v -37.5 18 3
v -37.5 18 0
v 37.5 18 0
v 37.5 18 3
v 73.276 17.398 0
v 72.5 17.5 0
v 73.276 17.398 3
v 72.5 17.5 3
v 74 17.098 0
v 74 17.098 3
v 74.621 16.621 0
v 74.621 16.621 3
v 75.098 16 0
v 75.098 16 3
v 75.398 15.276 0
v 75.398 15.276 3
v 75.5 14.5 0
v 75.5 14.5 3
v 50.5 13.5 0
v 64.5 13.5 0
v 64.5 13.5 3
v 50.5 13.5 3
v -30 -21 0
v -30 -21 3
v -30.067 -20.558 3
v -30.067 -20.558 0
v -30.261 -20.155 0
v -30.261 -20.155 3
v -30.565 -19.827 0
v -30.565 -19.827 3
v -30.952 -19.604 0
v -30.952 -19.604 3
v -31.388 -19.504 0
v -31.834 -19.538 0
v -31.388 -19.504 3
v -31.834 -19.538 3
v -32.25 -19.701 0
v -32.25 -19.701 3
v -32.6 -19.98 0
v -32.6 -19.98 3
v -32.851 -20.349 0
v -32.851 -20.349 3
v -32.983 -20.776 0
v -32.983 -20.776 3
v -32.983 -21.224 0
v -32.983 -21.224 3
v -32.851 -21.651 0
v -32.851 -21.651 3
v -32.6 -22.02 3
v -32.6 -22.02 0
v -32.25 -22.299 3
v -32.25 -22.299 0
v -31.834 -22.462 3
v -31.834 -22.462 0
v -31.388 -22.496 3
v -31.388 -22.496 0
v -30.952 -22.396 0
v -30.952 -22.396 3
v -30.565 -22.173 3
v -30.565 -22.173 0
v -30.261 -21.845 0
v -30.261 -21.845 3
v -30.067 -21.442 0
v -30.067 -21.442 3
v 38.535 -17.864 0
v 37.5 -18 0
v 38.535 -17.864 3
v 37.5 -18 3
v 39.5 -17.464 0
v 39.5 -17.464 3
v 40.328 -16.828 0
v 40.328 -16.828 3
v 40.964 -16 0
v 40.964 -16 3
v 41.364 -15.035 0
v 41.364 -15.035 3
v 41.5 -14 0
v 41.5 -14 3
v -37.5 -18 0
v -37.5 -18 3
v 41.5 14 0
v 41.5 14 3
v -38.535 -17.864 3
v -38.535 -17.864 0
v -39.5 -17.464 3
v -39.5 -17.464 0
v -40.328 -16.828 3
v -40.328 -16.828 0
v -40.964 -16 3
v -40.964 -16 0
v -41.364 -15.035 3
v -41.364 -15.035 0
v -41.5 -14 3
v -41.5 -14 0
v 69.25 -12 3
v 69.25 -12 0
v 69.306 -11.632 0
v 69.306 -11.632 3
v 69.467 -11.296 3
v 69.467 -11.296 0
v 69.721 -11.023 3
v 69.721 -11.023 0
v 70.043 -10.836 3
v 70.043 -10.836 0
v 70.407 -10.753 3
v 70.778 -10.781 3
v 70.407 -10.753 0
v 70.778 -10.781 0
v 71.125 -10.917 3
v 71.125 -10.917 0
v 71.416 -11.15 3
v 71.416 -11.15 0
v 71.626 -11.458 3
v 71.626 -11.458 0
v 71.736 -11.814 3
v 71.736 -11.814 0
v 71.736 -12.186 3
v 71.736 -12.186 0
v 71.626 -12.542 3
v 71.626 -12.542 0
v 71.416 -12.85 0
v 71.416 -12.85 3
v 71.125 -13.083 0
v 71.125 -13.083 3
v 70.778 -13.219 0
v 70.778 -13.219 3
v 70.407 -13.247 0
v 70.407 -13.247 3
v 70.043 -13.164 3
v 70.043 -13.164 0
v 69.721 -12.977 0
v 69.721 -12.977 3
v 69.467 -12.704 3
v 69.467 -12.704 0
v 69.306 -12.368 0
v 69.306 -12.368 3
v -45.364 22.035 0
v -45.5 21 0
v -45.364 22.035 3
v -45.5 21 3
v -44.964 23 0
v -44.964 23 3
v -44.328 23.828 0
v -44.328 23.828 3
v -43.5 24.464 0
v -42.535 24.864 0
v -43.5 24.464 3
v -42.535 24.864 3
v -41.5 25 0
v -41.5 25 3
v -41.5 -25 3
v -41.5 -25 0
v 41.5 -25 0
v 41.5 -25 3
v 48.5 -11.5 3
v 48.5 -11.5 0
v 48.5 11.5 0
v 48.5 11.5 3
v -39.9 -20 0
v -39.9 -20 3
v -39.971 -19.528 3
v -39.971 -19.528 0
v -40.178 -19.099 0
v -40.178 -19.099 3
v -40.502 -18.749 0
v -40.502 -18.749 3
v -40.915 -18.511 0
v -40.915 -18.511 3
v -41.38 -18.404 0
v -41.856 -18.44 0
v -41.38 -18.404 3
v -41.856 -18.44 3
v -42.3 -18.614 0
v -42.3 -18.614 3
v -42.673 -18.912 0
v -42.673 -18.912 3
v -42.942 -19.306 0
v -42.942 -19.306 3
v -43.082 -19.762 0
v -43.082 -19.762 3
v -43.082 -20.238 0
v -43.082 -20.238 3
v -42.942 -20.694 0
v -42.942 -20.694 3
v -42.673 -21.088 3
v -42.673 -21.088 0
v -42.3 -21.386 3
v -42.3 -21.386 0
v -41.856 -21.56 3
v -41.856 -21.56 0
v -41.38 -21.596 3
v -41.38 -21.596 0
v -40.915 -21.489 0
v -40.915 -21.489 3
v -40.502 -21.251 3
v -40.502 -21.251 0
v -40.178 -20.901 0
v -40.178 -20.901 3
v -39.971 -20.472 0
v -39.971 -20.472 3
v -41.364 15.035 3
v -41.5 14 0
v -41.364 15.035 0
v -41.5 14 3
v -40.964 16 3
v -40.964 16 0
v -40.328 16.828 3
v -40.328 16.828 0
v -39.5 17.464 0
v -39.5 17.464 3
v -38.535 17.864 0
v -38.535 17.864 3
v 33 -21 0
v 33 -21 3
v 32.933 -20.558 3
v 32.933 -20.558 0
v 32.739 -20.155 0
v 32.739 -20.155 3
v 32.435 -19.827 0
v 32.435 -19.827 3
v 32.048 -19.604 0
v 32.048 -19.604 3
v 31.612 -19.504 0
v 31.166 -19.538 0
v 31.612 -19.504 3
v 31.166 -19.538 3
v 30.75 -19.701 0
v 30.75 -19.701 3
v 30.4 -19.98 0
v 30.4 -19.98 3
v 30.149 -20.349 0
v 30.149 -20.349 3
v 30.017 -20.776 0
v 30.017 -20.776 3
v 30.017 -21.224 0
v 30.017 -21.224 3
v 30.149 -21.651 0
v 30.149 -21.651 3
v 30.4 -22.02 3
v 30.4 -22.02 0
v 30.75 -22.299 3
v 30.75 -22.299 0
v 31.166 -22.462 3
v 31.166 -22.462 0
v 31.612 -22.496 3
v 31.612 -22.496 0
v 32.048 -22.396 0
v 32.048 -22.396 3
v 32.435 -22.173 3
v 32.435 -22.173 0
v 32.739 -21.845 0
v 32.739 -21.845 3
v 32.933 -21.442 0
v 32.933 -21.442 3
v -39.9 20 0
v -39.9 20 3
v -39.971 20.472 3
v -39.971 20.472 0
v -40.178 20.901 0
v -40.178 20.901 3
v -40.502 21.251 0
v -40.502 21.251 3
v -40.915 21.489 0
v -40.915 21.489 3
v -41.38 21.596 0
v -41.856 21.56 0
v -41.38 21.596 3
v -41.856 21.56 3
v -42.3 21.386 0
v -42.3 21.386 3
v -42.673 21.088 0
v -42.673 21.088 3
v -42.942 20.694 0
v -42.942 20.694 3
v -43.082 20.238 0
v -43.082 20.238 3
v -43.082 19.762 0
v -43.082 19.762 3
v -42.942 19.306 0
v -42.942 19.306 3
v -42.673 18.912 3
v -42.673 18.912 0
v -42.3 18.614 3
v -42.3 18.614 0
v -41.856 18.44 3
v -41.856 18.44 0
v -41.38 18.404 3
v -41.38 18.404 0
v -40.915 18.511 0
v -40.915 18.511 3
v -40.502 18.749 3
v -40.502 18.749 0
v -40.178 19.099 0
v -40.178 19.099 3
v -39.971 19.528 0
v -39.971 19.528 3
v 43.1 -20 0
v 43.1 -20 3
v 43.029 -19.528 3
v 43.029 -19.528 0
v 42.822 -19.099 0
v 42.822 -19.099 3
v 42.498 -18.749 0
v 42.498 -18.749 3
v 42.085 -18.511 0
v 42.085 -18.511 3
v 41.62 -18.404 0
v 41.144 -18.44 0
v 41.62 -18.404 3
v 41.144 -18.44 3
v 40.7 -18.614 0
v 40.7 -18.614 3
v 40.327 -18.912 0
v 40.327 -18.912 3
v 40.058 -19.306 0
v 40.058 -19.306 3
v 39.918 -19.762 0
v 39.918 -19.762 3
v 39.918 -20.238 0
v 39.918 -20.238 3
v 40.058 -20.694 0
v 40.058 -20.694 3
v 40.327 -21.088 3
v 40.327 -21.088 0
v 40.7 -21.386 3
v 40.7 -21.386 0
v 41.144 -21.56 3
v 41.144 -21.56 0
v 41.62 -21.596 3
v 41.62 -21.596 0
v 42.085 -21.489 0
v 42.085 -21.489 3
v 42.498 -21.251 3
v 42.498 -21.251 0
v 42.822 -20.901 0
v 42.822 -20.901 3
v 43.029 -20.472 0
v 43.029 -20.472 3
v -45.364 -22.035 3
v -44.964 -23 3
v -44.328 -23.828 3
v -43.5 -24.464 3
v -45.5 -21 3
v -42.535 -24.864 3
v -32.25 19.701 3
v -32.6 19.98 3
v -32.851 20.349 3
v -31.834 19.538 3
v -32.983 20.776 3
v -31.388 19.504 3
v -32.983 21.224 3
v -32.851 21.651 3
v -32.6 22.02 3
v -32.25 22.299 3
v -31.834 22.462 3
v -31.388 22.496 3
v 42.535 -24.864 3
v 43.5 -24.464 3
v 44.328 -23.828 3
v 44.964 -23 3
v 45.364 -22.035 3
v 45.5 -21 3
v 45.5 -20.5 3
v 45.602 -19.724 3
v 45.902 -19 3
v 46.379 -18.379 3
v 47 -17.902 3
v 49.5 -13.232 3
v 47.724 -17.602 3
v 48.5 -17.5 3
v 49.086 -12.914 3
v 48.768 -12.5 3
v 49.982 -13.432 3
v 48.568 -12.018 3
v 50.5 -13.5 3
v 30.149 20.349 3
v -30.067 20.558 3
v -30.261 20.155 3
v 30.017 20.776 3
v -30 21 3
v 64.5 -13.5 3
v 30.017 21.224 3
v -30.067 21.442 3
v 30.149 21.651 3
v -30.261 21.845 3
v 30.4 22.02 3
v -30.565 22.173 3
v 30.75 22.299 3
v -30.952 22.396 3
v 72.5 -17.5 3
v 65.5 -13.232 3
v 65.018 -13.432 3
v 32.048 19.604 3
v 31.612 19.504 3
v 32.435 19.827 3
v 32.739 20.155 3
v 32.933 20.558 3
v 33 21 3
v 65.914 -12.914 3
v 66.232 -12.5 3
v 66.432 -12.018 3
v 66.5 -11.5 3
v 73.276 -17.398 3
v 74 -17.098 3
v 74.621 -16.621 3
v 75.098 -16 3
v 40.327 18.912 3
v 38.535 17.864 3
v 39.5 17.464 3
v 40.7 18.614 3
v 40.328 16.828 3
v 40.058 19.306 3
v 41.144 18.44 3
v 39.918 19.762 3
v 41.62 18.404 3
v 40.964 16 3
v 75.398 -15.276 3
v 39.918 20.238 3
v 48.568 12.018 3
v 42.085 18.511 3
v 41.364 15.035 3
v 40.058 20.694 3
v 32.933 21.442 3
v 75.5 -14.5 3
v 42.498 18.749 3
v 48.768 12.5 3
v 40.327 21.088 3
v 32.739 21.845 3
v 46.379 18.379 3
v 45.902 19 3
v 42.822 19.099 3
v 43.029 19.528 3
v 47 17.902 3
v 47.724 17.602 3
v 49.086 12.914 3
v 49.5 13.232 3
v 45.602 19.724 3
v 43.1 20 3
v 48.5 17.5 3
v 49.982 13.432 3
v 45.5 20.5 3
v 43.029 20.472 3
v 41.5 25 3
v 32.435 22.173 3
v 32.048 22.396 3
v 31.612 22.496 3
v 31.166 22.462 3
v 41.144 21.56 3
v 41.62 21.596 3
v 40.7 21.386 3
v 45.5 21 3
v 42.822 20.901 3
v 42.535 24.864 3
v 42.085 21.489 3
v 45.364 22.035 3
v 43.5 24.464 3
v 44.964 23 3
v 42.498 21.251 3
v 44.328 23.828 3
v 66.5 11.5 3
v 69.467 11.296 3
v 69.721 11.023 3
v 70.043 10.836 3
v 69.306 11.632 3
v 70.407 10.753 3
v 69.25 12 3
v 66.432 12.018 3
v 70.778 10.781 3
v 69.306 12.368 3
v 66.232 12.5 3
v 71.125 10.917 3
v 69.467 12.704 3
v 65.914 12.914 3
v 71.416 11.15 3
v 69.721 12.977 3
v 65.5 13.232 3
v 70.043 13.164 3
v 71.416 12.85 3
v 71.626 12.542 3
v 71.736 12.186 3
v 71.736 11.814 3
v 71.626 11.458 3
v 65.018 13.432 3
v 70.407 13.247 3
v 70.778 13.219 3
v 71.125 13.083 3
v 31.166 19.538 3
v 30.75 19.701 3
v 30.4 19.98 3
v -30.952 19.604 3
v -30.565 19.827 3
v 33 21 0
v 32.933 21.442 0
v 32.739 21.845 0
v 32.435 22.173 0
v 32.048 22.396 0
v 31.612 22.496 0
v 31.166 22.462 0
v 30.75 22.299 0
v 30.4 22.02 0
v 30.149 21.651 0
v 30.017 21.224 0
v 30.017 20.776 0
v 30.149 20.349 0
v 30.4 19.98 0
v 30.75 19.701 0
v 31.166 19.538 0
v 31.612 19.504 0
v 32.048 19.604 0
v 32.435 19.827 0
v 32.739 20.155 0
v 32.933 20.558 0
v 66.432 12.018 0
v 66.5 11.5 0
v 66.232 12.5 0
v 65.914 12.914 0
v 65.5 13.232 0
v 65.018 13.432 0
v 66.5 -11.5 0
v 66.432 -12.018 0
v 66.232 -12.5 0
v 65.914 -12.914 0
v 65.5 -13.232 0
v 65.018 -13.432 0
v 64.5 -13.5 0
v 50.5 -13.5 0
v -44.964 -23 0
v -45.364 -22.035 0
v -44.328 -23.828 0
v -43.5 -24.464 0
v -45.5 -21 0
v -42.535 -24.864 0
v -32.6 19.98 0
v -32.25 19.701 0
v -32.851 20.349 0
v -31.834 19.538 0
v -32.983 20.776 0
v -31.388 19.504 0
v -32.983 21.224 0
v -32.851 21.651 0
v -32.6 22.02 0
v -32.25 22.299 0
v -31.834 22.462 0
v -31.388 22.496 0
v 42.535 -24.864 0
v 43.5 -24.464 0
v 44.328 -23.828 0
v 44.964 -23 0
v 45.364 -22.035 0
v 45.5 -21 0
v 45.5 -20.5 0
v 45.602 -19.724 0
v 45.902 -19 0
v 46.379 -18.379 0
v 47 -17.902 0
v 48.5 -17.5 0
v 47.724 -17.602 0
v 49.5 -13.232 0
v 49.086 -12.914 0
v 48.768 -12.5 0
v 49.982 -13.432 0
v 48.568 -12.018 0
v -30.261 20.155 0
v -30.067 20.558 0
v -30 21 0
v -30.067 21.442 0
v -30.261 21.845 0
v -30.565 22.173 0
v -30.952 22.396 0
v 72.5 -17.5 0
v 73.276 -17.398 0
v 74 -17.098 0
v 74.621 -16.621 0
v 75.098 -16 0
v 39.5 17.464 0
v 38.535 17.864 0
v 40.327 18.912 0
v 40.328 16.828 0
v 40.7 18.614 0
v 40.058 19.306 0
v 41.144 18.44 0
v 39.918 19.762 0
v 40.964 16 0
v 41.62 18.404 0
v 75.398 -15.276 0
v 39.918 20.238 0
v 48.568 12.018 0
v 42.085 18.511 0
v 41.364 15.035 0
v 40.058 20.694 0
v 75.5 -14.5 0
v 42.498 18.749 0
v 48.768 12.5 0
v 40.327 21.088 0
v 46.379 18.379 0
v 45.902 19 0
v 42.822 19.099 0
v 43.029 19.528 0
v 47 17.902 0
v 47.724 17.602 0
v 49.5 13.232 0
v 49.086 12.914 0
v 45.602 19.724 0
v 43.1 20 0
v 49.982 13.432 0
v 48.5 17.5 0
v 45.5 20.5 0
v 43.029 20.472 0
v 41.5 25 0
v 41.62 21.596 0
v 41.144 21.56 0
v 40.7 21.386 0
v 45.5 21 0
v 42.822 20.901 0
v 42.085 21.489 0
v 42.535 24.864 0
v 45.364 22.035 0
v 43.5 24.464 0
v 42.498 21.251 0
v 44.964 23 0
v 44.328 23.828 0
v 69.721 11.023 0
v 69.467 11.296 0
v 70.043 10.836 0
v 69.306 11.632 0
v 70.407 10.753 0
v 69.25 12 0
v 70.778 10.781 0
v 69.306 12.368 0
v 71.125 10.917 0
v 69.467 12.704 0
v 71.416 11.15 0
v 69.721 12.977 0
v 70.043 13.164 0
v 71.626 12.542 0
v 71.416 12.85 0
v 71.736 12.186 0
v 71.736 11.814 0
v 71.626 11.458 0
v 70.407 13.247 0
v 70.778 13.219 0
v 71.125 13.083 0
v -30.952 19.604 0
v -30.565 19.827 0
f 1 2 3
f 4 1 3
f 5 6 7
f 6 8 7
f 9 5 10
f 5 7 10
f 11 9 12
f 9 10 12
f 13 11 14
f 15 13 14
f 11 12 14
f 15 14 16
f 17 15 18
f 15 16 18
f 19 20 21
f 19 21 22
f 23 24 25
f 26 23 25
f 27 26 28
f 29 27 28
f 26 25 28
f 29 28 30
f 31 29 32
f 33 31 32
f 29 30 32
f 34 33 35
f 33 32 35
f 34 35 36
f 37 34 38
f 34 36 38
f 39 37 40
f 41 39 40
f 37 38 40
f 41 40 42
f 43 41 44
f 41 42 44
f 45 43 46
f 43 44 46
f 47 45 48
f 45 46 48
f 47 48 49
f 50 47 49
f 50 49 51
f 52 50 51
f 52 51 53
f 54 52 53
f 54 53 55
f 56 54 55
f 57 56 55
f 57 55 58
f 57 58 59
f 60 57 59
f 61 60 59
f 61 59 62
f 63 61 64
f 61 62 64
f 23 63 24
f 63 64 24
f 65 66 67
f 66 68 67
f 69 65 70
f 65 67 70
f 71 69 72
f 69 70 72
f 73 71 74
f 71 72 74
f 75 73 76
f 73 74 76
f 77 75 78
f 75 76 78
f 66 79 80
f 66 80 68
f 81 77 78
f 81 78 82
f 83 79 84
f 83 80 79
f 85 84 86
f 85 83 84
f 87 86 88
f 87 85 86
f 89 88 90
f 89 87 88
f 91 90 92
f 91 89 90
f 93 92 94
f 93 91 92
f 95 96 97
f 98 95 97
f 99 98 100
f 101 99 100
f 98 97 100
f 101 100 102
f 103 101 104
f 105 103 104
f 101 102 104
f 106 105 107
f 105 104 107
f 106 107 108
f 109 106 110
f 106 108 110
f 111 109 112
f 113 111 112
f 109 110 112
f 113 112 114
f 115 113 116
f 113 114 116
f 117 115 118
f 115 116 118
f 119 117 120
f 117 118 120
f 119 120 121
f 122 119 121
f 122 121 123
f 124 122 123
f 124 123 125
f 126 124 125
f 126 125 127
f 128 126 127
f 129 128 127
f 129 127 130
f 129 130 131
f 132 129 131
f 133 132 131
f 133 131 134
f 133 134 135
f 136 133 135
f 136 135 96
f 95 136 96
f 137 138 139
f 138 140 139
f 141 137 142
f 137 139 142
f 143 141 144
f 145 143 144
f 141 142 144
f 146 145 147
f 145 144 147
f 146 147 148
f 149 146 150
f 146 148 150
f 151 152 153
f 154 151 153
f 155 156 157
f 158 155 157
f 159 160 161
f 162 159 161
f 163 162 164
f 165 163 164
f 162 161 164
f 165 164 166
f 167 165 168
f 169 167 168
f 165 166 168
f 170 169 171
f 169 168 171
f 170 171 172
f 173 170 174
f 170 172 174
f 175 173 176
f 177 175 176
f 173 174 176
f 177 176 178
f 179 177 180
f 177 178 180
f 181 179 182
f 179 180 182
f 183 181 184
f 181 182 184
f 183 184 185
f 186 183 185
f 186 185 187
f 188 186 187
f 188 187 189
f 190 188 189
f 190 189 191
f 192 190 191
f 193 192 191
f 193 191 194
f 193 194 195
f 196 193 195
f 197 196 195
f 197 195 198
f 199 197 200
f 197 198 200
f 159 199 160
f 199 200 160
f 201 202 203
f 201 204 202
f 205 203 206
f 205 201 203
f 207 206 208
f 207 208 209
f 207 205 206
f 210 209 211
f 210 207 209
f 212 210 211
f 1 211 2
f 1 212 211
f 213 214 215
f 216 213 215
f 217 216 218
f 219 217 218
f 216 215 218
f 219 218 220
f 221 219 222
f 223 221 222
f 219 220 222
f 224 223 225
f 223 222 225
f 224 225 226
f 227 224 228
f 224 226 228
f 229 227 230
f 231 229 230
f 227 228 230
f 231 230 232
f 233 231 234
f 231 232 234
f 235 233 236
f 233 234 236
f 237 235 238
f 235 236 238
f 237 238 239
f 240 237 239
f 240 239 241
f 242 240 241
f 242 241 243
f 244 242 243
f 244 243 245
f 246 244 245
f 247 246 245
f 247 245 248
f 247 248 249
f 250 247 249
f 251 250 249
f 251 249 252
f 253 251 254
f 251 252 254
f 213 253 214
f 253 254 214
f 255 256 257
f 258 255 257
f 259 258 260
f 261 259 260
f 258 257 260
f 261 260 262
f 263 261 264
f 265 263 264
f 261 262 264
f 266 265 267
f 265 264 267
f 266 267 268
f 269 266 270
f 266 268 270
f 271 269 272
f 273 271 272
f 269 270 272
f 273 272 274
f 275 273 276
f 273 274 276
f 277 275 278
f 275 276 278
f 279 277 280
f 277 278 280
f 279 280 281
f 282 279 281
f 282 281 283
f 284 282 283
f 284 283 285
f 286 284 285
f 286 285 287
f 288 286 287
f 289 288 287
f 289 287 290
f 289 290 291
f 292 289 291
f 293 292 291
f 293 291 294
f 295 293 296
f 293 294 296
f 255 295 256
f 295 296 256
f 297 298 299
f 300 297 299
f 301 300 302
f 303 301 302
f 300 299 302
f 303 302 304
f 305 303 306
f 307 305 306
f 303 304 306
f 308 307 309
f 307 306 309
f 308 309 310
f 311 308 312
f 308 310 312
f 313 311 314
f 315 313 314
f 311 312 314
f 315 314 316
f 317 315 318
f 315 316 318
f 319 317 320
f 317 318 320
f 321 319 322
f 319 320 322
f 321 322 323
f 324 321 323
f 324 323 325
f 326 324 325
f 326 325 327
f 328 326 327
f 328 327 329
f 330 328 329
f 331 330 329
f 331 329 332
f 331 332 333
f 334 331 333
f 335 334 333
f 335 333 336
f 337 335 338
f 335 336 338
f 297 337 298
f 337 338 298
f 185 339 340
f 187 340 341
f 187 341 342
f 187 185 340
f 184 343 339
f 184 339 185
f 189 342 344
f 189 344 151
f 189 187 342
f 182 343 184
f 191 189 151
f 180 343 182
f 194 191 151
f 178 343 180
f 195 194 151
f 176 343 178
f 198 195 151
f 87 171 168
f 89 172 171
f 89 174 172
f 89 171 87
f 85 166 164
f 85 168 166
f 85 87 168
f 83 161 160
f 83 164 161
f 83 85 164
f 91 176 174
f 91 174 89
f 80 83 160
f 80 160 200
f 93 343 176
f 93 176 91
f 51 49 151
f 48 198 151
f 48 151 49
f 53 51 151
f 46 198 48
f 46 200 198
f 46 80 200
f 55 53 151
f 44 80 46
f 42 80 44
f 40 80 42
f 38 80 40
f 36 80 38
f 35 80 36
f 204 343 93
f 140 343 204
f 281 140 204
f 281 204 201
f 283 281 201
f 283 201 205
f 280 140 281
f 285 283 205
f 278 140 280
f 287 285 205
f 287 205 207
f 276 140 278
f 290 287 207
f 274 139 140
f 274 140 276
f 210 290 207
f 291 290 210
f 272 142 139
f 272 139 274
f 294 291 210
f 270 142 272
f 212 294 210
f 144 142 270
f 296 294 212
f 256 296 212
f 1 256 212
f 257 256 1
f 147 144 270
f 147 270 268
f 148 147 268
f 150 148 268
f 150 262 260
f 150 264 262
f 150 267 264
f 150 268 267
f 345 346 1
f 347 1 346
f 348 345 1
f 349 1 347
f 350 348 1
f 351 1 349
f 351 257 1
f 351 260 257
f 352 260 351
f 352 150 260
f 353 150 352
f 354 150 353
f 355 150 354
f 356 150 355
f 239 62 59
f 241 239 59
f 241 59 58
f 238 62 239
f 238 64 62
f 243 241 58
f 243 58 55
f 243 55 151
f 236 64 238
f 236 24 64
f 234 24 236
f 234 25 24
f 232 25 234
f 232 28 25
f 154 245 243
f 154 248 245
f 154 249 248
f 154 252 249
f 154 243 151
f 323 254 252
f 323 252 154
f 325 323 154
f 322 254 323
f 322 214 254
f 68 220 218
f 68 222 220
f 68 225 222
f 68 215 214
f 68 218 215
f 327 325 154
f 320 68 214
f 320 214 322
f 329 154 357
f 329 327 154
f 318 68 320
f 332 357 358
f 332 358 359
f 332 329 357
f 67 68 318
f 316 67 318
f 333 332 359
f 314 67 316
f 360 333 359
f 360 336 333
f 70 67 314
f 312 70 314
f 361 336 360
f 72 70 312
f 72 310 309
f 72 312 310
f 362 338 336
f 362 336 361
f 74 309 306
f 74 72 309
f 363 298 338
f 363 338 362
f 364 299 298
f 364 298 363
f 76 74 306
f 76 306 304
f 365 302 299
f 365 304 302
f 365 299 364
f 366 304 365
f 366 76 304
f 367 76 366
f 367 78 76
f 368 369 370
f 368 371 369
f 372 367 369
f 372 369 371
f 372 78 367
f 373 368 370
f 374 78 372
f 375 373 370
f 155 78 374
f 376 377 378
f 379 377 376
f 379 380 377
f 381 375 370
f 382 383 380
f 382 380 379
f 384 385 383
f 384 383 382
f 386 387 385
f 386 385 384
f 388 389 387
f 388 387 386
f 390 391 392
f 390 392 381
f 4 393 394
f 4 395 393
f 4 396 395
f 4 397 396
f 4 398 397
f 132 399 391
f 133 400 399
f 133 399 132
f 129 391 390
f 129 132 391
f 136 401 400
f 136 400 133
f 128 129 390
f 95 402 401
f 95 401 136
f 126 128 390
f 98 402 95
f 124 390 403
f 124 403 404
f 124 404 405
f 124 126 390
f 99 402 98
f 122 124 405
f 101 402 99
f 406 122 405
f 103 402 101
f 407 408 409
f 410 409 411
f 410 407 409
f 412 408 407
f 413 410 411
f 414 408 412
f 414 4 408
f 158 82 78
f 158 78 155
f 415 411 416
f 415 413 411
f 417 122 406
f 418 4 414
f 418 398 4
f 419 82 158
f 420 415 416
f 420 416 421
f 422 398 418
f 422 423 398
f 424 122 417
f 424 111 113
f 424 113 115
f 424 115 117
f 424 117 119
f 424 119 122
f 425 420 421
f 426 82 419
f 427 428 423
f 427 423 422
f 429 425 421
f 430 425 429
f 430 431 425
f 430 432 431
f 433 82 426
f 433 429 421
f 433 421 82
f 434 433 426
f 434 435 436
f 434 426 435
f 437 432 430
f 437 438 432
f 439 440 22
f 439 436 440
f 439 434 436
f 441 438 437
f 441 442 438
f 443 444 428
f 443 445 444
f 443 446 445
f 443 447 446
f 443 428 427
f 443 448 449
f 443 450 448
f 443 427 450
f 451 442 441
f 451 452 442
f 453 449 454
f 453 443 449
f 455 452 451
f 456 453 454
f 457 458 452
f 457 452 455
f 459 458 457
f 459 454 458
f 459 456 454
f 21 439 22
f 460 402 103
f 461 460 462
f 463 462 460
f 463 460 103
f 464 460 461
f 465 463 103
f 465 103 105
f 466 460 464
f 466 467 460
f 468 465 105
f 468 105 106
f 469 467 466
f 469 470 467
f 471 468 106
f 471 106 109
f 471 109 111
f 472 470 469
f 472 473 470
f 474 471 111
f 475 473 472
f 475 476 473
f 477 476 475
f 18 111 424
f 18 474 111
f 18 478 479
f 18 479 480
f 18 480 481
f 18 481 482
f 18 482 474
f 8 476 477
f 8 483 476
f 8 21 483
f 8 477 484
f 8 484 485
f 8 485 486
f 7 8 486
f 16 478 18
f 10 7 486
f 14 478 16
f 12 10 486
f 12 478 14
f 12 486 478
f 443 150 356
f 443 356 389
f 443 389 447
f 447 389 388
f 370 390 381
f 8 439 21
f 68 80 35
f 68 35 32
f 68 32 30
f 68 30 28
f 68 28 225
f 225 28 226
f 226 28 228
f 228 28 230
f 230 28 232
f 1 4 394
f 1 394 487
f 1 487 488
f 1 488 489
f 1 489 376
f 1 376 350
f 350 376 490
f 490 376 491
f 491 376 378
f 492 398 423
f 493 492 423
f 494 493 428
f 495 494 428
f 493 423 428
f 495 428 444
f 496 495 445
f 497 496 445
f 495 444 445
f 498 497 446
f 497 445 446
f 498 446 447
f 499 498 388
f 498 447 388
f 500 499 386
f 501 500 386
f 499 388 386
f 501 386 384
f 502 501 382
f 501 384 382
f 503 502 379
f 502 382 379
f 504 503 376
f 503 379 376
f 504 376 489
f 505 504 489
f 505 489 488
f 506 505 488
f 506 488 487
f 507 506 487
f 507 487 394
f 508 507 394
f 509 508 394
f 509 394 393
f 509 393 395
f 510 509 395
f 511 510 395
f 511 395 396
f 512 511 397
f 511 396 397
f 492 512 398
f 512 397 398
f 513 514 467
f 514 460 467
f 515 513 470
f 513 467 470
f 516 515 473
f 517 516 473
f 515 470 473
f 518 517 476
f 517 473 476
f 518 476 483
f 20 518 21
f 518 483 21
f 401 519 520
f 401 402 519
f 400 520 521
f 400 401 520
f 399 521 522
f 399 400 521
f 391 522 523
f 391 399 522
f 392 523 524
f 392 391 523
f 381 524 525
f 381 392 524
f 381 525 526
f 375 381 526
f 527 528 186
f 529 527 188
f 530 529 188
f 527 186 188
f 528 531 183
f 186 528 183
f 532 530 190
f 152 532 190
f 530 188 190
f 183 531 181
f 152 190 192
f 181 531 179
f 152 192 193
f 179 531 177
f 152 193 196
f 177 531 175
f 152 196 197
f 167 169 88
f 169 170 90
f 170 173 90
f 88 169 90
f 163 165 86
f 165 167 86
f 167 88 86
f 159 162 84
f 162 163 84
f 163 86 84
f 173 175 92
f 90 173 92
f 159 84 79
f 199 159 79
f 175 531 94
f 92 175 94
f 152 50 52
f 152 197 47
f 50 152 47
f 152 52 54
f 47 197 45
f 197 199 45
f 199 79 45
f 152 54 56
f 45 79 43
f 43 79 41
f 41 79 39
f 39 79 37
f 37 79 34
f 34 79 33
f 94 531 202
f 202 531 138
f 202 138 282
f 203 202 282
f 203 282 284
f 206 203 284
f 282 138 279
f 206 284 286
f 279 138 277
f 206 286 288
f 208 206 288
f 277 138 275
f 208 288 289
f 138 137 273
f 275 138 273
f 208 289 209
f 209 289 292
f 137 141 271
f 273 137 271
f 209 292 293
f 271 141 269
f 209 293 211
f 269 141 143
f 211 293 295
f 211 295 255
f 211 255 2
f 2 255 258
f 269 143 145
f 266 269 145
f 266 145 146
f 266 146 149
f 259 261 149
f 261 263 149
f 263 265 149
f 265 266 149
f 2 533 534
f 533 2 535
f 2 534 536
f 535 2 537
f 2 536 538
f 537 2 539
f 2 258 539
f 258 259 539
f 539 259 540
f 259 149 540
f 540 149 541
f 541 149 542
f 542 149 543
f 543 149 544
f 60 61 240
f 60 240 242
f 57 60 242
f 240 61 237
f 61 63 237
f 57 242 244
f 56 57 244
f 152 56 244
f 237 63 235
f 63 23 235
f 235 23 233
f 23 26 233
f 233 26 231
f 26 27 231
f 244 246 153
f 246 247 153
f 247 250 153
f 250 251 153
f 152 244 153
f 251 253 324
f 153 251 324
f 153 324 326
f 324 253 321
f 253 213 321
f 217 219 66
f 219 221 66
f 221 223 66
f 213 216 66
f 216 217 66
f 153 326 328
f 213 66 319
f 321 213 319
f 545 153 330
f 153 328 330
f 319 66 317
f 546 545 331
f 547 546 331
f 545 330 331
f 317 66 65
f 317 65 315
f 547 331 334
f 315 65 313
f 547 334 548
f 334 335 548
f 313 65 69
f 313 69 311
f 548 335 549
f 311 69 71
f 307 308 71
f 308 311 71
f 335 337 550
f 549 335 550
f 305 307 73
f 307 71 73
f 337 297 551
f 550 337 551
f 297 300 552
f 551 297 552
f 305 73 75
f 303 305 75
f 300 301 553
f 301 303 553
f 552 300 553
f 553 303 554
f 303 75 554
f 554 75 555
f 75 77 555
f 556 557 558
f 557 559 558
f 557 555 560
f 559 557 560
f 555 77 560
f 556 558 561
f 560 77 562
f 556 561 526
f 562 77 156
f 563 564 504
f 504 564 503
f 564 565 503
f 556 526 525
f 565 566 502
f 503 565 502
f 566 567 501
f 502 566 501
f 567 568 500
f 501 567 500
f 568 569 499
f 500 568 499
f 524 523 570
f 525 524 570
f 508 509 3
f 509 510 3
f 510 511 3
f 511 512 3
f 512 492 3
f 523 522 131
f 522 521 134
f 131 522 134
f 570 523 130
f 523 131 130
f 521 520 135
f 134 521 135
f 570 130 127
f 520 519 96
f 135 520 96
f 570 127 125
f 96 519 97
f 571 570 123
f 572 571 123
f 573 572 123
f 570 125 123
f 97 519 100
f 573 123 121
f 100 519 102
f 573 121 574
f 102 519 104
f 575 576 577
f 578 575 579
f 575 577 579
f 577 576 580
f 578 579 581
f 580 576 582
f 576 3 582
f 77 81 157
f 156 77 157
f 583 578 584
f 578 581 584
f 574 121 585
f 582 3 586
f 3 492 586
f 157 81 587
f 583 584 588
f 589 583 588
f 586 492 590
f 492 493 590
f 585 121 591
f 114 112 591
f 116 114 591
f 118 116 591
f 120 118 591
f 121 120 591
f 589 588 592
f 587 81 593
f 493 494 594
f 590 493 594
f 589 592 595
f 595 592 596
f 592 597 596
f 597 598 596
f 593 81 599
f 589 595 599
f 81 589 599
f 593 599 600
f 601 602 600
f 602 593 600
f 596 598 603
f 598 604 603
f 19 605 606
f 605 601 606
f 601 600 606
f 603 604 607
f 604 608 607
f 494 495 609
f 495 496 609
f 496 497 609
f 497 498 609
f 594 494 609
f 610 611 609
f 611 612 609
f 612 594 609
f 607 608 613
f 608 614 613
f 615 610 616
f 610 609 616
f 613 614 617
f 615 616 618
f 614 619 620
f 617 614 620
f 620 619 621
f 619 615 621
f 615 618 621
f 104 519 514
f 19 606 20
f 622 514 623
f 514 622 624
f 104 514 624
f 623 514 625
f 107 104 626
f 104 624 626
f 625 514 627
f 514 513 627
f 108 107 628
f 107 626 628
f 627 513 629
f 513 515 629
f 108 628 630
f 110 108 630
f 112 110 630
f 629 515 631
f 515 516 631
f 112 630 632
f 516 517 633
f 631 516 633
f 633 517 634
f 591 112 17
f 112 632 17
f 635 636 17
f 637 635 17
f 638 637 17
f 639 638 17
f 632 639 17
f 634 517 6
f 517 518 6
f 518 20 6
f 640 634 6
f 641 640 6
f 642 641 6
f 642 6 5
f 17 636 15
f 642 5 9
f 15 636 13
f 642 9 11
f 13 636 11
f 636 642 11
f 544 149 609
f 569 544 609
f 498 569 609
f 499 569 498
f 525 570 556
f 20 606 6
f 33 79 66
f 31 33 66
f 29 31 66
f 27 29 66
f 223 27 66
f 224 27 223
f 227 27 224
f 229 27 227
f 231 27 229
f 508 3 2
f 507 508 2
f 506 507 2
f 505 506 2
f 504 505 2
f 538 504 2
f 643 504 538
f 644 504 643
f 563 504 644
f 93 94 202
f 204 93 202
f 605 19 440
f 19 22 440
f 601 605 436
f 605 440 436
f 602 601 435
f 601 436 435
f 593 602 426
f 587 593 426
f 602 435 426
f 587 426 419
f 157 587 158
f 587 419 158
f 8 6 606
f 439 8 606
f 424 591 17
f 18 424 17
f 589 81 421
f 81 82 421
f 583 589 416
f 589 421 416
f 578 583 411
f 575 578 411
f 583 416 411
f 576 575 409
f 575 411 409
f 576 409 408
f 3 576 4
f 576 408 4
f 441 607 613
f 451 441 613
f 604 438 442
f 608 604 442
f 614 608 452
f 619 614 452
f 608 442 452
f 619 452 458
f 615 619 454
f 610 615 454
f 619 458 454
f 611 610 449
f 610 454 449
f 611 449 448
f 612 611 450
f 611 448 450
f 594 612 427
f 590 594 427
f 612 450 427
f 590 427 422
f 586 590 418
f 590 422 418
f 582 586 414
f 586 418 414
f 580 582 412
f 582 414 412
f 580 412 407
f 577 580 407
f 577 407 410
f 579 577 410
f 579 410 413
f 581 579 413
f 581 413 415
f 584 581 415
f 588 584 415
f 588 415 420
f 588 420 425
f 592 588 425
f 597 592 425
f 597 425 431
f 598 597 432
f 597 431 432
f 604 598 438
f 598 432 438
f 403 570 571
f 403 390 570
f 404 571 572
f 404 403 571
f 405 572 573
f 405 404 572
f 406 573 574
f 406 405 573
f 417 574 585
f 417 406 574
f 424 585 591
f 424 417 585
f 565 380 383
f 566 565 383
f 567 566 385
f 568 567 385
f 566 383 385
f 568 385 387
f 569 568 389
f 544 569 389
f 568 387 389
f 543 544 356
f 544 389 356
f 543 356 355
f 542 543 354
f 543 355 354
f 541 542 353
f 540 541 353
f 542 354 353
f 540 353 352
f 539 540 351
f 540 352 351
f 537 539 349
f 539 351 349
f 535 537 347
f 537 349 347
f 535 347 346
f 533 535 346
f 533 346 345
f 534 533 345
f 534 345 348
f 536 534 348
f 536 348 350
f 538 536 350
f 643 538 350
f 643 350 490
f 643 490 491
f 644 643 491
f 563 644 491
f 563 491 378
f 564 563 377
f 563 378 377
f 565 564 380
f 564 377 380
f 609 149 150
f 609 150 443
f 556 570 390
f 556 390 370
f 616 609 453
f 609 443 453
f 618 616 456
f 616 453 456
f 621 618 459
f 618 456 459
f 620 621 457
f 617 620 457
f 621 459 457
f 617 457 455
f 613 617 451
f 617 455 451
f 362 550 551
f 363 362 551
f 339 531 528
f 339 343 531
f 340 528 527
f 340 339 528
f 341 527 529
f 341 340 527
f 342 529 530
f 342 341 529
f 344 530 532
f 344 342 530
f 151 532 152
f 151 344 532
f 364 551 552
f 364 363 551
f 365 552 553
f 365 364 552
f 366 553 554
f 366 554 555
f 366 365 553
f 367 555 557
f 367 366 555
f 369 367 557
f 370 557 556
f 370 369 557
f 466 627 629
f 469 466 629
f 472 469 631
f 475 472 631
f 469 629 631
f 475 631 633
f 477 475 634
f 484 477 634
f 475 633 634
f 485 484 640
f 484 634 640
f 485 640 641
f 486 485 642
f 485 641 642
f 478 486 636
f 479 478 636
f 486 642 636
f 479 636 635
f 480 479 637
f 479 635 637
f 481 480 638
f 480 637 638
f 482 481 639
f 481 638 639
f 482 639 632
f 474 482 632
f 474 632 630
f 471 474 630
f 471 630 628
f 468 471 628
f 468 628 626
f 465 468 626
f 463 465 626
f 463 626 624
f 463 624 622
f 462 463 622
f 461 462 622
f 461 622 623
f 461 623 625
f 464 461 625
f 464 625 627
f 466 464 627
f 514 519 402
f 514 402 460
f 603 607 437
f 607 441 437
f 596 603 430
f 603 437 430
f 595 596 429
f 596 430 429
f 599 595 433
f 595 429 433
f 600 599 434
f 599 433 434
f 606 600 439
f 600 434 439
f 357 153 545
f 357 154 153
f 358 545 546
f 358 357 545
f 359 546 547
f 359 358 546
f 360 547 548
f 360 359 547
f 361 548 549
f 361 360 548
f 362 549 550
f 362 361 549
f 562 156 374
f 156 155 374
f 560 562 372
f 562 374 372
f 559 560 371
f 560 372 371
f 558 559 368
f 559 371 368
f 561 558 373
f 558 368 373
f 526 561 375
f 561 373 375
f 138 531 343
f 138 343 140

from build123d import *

# Parameters (mm, degrees)
SKETCH_1_W          = 91
SKETCH_1_H          = 50
SKETCH_1_W_2        = 83
SKETCH_1_H_2        = 36
EXTRUDE_1_DEPTH     = 3
SKETCH_2_R          = 1.5
CUT_EXTRUDE_1_DEPTH = 3
SKETCH_3_R          = 1.6
CUT_EXTRUDE_2_DEPTH = 3
FILLET_1_R          = 4
SKETCH_4_W          = 30
SKETCH_4_H          = 35
EXTRUDE_2_DEPTH     = 3
SKETCH_5_R          = 1.25
CUT_EXTRUDE_3_DEPTH = 10
FILLET_2_R          = 3
SKETCH_6_W          = 18
SKETCH_6_H          = 27
CUT_EXTRUDE_4_DEPTH = 10
FILLET_3_R          = 2
SKETCH_7_W          = 38
SKETCH_7_H          = 10
SKETCH_7_R          = 1.6
EXTRUDE_3_DEPTH     = 3
FILLET_4_R          = 2
FILLET_5_R          = 2
SKETCH_8_W          = 42
SKETCH_8_H          = 10
CUT_EXTRUDE_5_DEPTH = 10


with BuildPart() as part:
    # 草图1 → 凸台-拉伸1 (new body)
    with BuildSketch(Plane.XY):
        Rectangle(SKETCH_1_W, SKETCH_1_H)
        Rectangle(SKETCH_1_W_2, SKETCH_1_H_2, mode=Mode.SUBTRACT)
    extrude(amount=EXTRUDE_1_DEPTH)

    # 草图2 → 切除-拉伸1 (cut)
    with BuildSketch(Plane.XY.offset(3)):
        with Locations((31.5, 21)):
            Circle(SKETCH_2_R)
        with Locations((31.5, -21)):
            Circle(SKETCH_2_R)
        with Locations((-31.5, -21)):
            Circle(SKETCH_2_R)
        with Locations((-31.5, 21)):
            Circle(SKETCH_2_R)
    extrude(amount=-CUT_EXTRUDE_1_DEPTH, mode=Mode.SUBTRACT)

    # 草图3 → 切除-拉伸2 (cut)
    with BuildSketch(Plane.XY.offset(3)):
        with Locations((41.5, 20)):
            Circle(SKETCH_3_R)
        with Locations((41.5, -20)):
            Circle(SKETCH_3_R)
        with Locations((-41.5, -20)):
            Circle(SKETCH_3_R)
        with Locations((-41.5, 20)):
            Circle(SKETCH_3_R)
    extrude(amount=-CUT_EXTRUDE_2_DEPTH, mode=Mode.SUBTRACT)

    # 圆角1
    fillet_1_edges = [part.edges().sort_by_distance(p)[0] for p in [
        (41.5, -18, 1.5),
        (41.5, 18, 1.5),
        (-41.5, 18, 1.5),
        (-41.5, -18, 1.5),
        (45.5, -25, 1.5),
        (-45.5, -25, 1.5),
        (-45.5, 25, 1.5),
        (45.5, 25, 1.5),
    ]]
    fillet(fillet_1_edges, radius=FILLET_1_R)

    # 草图4 → 凸台-拉伸2 (add)
    with BuildSketch(Plane(origin=(0, 0, 0), x_dir=(-1, 0, 0), z_dir=(0, 0, -1))):
        with Locations((-60.5, 0)):
            Rectangle(SKETCH_4_W, SKETCH_4_H)
    extrude(amount=-EXTRUDE_2_DEPTH)

    # 草图5 → 切除-拉伸3 (cut)
    with BuildSketch(Plane(origin=(0, 0, 0), x_dir=(-1, 0, 0), z_dir=(0, 0, -1))):
        with Locations((-70.5, -12)):
            Circle(SKETCH_5_R)
        with Locations((-70.5, 12)):
            Circle(SKETCH_5_R)
    extrude(amount=-CUT_EXTRUDE_3_DEPTH, mode=Mode.SUBTRACT)

    # 圆角2
    fillet_2_edges = [part.edges().sort_by_distance(p)[0] for p in [
        (45.5, 17.5, 1.5),
        (45.5, -17.5, 1.5),
        (75.5, -17.5, 1.5),
        (75.5, 17.5, 1.5),
    ]]
    fillet(fillet_2_edges, radius=FILLET_2_R)

    # 草图6 → 切除-拉伸4 (cut)
    with BuildSketch(Plane(origin=(0, 0, 0), x_dir=(-1, 0, 0), z_dir=(0, 0, -1))):
        with Locations((-57.5, 0)):
            Rectangle(SKETCH_6_W, SKETCH_6_H)
    extrude(amount=-CUT_EXTRUDE_4_DEPTH, mode=Mode.SUBTRACT)

    # 圆角3
    fillet_3_edges = [part.edges().sort_by_distance(p)[0] for p in [
        (66.5, -13.5, 1.5),
        (66.5, 13.5, 1.5),
        (48.5, 13.5, 1.5),
        (48.5, -13.5, 1.5),
    ]]
    fillet(fillet_3_edges, radius=FILLET_3_R)

    # 草图7 → 凸台-拉伸3 (add)
    # profile 1 of 2: a face of its own
    with BuildSketch(Plane(origin=(0, 0, 0), x_dir=(-1, 0, 0), z_dir=(0, 0, -1))):
        with Locations((0, 30)):
            Rectangle(SKETCH_7_W, SKETCH_7_H)
        with Locations((-16, 32)):
            Circle(SKETCH_7_R, mode=Mode.SUBTRACT)
        with Locations((16, 32)):
            Circle(SKETCH_7_R, mode=Mode.SUBTRACT)
    # profile 2 of 2: a face of its own
    with BuildSketch(Plane(origin=(0, 0, 0), x_dir=(-1, 0, 0), z_dir=(0, 0, -1))):
        with Locations((0, -30)):
            Rectangle(SKETCH_7_W, SKETCH_7_H)
        with Locations((16, -32)):
            Circle(SKETCH_7_R, mode=Mode.SUBTRACT)
        with Locations((-16, -32)):
            Circle(SKETCH_7_R, mode=Mode.SUBTRACT)
    extrude(amount=-EXTRUDE_3_DEPTH)

    # 圆角4
    fillet_4_edges = [part.edges().sort_by_distance(p)[0] for p in [
        (19, 35, 1.5),
        (-19, 35, 1.5),
        (-19, -35, 1.5),
        (19, -35, 1.5),
    ]]
    fillet(fillet_4_edges, radius=FILLET_4_R)

    # 圆角5
    fillet_5_edges = [part.edges().sort_by_distance(p)[0] for p in [
        (19, 25, 1.5),
        (-19, 25, 1.5),
        (-19, -25, 1.5),
        (19, -25, 1.5),
    ]]
    fillet(fillet_5_edges, radius=FILLET_5_R)

    # 草图8 → 切除-拉伸5 (cut)
    with BuildSketch(Plane.XY.offset(3)):
        with Locations((0, 30)):
            Rectangle(SKETCH_8_W, SKETCH_8_H)
        with Locations((0, -30)):
            Rectangle(SKETCH_8_W, SKETCH_8_H)
    extrude(amount=-CUT_EXTRUDE_5_DEPTH, mode=Mode.SUBTRACT)


solid = part.part
